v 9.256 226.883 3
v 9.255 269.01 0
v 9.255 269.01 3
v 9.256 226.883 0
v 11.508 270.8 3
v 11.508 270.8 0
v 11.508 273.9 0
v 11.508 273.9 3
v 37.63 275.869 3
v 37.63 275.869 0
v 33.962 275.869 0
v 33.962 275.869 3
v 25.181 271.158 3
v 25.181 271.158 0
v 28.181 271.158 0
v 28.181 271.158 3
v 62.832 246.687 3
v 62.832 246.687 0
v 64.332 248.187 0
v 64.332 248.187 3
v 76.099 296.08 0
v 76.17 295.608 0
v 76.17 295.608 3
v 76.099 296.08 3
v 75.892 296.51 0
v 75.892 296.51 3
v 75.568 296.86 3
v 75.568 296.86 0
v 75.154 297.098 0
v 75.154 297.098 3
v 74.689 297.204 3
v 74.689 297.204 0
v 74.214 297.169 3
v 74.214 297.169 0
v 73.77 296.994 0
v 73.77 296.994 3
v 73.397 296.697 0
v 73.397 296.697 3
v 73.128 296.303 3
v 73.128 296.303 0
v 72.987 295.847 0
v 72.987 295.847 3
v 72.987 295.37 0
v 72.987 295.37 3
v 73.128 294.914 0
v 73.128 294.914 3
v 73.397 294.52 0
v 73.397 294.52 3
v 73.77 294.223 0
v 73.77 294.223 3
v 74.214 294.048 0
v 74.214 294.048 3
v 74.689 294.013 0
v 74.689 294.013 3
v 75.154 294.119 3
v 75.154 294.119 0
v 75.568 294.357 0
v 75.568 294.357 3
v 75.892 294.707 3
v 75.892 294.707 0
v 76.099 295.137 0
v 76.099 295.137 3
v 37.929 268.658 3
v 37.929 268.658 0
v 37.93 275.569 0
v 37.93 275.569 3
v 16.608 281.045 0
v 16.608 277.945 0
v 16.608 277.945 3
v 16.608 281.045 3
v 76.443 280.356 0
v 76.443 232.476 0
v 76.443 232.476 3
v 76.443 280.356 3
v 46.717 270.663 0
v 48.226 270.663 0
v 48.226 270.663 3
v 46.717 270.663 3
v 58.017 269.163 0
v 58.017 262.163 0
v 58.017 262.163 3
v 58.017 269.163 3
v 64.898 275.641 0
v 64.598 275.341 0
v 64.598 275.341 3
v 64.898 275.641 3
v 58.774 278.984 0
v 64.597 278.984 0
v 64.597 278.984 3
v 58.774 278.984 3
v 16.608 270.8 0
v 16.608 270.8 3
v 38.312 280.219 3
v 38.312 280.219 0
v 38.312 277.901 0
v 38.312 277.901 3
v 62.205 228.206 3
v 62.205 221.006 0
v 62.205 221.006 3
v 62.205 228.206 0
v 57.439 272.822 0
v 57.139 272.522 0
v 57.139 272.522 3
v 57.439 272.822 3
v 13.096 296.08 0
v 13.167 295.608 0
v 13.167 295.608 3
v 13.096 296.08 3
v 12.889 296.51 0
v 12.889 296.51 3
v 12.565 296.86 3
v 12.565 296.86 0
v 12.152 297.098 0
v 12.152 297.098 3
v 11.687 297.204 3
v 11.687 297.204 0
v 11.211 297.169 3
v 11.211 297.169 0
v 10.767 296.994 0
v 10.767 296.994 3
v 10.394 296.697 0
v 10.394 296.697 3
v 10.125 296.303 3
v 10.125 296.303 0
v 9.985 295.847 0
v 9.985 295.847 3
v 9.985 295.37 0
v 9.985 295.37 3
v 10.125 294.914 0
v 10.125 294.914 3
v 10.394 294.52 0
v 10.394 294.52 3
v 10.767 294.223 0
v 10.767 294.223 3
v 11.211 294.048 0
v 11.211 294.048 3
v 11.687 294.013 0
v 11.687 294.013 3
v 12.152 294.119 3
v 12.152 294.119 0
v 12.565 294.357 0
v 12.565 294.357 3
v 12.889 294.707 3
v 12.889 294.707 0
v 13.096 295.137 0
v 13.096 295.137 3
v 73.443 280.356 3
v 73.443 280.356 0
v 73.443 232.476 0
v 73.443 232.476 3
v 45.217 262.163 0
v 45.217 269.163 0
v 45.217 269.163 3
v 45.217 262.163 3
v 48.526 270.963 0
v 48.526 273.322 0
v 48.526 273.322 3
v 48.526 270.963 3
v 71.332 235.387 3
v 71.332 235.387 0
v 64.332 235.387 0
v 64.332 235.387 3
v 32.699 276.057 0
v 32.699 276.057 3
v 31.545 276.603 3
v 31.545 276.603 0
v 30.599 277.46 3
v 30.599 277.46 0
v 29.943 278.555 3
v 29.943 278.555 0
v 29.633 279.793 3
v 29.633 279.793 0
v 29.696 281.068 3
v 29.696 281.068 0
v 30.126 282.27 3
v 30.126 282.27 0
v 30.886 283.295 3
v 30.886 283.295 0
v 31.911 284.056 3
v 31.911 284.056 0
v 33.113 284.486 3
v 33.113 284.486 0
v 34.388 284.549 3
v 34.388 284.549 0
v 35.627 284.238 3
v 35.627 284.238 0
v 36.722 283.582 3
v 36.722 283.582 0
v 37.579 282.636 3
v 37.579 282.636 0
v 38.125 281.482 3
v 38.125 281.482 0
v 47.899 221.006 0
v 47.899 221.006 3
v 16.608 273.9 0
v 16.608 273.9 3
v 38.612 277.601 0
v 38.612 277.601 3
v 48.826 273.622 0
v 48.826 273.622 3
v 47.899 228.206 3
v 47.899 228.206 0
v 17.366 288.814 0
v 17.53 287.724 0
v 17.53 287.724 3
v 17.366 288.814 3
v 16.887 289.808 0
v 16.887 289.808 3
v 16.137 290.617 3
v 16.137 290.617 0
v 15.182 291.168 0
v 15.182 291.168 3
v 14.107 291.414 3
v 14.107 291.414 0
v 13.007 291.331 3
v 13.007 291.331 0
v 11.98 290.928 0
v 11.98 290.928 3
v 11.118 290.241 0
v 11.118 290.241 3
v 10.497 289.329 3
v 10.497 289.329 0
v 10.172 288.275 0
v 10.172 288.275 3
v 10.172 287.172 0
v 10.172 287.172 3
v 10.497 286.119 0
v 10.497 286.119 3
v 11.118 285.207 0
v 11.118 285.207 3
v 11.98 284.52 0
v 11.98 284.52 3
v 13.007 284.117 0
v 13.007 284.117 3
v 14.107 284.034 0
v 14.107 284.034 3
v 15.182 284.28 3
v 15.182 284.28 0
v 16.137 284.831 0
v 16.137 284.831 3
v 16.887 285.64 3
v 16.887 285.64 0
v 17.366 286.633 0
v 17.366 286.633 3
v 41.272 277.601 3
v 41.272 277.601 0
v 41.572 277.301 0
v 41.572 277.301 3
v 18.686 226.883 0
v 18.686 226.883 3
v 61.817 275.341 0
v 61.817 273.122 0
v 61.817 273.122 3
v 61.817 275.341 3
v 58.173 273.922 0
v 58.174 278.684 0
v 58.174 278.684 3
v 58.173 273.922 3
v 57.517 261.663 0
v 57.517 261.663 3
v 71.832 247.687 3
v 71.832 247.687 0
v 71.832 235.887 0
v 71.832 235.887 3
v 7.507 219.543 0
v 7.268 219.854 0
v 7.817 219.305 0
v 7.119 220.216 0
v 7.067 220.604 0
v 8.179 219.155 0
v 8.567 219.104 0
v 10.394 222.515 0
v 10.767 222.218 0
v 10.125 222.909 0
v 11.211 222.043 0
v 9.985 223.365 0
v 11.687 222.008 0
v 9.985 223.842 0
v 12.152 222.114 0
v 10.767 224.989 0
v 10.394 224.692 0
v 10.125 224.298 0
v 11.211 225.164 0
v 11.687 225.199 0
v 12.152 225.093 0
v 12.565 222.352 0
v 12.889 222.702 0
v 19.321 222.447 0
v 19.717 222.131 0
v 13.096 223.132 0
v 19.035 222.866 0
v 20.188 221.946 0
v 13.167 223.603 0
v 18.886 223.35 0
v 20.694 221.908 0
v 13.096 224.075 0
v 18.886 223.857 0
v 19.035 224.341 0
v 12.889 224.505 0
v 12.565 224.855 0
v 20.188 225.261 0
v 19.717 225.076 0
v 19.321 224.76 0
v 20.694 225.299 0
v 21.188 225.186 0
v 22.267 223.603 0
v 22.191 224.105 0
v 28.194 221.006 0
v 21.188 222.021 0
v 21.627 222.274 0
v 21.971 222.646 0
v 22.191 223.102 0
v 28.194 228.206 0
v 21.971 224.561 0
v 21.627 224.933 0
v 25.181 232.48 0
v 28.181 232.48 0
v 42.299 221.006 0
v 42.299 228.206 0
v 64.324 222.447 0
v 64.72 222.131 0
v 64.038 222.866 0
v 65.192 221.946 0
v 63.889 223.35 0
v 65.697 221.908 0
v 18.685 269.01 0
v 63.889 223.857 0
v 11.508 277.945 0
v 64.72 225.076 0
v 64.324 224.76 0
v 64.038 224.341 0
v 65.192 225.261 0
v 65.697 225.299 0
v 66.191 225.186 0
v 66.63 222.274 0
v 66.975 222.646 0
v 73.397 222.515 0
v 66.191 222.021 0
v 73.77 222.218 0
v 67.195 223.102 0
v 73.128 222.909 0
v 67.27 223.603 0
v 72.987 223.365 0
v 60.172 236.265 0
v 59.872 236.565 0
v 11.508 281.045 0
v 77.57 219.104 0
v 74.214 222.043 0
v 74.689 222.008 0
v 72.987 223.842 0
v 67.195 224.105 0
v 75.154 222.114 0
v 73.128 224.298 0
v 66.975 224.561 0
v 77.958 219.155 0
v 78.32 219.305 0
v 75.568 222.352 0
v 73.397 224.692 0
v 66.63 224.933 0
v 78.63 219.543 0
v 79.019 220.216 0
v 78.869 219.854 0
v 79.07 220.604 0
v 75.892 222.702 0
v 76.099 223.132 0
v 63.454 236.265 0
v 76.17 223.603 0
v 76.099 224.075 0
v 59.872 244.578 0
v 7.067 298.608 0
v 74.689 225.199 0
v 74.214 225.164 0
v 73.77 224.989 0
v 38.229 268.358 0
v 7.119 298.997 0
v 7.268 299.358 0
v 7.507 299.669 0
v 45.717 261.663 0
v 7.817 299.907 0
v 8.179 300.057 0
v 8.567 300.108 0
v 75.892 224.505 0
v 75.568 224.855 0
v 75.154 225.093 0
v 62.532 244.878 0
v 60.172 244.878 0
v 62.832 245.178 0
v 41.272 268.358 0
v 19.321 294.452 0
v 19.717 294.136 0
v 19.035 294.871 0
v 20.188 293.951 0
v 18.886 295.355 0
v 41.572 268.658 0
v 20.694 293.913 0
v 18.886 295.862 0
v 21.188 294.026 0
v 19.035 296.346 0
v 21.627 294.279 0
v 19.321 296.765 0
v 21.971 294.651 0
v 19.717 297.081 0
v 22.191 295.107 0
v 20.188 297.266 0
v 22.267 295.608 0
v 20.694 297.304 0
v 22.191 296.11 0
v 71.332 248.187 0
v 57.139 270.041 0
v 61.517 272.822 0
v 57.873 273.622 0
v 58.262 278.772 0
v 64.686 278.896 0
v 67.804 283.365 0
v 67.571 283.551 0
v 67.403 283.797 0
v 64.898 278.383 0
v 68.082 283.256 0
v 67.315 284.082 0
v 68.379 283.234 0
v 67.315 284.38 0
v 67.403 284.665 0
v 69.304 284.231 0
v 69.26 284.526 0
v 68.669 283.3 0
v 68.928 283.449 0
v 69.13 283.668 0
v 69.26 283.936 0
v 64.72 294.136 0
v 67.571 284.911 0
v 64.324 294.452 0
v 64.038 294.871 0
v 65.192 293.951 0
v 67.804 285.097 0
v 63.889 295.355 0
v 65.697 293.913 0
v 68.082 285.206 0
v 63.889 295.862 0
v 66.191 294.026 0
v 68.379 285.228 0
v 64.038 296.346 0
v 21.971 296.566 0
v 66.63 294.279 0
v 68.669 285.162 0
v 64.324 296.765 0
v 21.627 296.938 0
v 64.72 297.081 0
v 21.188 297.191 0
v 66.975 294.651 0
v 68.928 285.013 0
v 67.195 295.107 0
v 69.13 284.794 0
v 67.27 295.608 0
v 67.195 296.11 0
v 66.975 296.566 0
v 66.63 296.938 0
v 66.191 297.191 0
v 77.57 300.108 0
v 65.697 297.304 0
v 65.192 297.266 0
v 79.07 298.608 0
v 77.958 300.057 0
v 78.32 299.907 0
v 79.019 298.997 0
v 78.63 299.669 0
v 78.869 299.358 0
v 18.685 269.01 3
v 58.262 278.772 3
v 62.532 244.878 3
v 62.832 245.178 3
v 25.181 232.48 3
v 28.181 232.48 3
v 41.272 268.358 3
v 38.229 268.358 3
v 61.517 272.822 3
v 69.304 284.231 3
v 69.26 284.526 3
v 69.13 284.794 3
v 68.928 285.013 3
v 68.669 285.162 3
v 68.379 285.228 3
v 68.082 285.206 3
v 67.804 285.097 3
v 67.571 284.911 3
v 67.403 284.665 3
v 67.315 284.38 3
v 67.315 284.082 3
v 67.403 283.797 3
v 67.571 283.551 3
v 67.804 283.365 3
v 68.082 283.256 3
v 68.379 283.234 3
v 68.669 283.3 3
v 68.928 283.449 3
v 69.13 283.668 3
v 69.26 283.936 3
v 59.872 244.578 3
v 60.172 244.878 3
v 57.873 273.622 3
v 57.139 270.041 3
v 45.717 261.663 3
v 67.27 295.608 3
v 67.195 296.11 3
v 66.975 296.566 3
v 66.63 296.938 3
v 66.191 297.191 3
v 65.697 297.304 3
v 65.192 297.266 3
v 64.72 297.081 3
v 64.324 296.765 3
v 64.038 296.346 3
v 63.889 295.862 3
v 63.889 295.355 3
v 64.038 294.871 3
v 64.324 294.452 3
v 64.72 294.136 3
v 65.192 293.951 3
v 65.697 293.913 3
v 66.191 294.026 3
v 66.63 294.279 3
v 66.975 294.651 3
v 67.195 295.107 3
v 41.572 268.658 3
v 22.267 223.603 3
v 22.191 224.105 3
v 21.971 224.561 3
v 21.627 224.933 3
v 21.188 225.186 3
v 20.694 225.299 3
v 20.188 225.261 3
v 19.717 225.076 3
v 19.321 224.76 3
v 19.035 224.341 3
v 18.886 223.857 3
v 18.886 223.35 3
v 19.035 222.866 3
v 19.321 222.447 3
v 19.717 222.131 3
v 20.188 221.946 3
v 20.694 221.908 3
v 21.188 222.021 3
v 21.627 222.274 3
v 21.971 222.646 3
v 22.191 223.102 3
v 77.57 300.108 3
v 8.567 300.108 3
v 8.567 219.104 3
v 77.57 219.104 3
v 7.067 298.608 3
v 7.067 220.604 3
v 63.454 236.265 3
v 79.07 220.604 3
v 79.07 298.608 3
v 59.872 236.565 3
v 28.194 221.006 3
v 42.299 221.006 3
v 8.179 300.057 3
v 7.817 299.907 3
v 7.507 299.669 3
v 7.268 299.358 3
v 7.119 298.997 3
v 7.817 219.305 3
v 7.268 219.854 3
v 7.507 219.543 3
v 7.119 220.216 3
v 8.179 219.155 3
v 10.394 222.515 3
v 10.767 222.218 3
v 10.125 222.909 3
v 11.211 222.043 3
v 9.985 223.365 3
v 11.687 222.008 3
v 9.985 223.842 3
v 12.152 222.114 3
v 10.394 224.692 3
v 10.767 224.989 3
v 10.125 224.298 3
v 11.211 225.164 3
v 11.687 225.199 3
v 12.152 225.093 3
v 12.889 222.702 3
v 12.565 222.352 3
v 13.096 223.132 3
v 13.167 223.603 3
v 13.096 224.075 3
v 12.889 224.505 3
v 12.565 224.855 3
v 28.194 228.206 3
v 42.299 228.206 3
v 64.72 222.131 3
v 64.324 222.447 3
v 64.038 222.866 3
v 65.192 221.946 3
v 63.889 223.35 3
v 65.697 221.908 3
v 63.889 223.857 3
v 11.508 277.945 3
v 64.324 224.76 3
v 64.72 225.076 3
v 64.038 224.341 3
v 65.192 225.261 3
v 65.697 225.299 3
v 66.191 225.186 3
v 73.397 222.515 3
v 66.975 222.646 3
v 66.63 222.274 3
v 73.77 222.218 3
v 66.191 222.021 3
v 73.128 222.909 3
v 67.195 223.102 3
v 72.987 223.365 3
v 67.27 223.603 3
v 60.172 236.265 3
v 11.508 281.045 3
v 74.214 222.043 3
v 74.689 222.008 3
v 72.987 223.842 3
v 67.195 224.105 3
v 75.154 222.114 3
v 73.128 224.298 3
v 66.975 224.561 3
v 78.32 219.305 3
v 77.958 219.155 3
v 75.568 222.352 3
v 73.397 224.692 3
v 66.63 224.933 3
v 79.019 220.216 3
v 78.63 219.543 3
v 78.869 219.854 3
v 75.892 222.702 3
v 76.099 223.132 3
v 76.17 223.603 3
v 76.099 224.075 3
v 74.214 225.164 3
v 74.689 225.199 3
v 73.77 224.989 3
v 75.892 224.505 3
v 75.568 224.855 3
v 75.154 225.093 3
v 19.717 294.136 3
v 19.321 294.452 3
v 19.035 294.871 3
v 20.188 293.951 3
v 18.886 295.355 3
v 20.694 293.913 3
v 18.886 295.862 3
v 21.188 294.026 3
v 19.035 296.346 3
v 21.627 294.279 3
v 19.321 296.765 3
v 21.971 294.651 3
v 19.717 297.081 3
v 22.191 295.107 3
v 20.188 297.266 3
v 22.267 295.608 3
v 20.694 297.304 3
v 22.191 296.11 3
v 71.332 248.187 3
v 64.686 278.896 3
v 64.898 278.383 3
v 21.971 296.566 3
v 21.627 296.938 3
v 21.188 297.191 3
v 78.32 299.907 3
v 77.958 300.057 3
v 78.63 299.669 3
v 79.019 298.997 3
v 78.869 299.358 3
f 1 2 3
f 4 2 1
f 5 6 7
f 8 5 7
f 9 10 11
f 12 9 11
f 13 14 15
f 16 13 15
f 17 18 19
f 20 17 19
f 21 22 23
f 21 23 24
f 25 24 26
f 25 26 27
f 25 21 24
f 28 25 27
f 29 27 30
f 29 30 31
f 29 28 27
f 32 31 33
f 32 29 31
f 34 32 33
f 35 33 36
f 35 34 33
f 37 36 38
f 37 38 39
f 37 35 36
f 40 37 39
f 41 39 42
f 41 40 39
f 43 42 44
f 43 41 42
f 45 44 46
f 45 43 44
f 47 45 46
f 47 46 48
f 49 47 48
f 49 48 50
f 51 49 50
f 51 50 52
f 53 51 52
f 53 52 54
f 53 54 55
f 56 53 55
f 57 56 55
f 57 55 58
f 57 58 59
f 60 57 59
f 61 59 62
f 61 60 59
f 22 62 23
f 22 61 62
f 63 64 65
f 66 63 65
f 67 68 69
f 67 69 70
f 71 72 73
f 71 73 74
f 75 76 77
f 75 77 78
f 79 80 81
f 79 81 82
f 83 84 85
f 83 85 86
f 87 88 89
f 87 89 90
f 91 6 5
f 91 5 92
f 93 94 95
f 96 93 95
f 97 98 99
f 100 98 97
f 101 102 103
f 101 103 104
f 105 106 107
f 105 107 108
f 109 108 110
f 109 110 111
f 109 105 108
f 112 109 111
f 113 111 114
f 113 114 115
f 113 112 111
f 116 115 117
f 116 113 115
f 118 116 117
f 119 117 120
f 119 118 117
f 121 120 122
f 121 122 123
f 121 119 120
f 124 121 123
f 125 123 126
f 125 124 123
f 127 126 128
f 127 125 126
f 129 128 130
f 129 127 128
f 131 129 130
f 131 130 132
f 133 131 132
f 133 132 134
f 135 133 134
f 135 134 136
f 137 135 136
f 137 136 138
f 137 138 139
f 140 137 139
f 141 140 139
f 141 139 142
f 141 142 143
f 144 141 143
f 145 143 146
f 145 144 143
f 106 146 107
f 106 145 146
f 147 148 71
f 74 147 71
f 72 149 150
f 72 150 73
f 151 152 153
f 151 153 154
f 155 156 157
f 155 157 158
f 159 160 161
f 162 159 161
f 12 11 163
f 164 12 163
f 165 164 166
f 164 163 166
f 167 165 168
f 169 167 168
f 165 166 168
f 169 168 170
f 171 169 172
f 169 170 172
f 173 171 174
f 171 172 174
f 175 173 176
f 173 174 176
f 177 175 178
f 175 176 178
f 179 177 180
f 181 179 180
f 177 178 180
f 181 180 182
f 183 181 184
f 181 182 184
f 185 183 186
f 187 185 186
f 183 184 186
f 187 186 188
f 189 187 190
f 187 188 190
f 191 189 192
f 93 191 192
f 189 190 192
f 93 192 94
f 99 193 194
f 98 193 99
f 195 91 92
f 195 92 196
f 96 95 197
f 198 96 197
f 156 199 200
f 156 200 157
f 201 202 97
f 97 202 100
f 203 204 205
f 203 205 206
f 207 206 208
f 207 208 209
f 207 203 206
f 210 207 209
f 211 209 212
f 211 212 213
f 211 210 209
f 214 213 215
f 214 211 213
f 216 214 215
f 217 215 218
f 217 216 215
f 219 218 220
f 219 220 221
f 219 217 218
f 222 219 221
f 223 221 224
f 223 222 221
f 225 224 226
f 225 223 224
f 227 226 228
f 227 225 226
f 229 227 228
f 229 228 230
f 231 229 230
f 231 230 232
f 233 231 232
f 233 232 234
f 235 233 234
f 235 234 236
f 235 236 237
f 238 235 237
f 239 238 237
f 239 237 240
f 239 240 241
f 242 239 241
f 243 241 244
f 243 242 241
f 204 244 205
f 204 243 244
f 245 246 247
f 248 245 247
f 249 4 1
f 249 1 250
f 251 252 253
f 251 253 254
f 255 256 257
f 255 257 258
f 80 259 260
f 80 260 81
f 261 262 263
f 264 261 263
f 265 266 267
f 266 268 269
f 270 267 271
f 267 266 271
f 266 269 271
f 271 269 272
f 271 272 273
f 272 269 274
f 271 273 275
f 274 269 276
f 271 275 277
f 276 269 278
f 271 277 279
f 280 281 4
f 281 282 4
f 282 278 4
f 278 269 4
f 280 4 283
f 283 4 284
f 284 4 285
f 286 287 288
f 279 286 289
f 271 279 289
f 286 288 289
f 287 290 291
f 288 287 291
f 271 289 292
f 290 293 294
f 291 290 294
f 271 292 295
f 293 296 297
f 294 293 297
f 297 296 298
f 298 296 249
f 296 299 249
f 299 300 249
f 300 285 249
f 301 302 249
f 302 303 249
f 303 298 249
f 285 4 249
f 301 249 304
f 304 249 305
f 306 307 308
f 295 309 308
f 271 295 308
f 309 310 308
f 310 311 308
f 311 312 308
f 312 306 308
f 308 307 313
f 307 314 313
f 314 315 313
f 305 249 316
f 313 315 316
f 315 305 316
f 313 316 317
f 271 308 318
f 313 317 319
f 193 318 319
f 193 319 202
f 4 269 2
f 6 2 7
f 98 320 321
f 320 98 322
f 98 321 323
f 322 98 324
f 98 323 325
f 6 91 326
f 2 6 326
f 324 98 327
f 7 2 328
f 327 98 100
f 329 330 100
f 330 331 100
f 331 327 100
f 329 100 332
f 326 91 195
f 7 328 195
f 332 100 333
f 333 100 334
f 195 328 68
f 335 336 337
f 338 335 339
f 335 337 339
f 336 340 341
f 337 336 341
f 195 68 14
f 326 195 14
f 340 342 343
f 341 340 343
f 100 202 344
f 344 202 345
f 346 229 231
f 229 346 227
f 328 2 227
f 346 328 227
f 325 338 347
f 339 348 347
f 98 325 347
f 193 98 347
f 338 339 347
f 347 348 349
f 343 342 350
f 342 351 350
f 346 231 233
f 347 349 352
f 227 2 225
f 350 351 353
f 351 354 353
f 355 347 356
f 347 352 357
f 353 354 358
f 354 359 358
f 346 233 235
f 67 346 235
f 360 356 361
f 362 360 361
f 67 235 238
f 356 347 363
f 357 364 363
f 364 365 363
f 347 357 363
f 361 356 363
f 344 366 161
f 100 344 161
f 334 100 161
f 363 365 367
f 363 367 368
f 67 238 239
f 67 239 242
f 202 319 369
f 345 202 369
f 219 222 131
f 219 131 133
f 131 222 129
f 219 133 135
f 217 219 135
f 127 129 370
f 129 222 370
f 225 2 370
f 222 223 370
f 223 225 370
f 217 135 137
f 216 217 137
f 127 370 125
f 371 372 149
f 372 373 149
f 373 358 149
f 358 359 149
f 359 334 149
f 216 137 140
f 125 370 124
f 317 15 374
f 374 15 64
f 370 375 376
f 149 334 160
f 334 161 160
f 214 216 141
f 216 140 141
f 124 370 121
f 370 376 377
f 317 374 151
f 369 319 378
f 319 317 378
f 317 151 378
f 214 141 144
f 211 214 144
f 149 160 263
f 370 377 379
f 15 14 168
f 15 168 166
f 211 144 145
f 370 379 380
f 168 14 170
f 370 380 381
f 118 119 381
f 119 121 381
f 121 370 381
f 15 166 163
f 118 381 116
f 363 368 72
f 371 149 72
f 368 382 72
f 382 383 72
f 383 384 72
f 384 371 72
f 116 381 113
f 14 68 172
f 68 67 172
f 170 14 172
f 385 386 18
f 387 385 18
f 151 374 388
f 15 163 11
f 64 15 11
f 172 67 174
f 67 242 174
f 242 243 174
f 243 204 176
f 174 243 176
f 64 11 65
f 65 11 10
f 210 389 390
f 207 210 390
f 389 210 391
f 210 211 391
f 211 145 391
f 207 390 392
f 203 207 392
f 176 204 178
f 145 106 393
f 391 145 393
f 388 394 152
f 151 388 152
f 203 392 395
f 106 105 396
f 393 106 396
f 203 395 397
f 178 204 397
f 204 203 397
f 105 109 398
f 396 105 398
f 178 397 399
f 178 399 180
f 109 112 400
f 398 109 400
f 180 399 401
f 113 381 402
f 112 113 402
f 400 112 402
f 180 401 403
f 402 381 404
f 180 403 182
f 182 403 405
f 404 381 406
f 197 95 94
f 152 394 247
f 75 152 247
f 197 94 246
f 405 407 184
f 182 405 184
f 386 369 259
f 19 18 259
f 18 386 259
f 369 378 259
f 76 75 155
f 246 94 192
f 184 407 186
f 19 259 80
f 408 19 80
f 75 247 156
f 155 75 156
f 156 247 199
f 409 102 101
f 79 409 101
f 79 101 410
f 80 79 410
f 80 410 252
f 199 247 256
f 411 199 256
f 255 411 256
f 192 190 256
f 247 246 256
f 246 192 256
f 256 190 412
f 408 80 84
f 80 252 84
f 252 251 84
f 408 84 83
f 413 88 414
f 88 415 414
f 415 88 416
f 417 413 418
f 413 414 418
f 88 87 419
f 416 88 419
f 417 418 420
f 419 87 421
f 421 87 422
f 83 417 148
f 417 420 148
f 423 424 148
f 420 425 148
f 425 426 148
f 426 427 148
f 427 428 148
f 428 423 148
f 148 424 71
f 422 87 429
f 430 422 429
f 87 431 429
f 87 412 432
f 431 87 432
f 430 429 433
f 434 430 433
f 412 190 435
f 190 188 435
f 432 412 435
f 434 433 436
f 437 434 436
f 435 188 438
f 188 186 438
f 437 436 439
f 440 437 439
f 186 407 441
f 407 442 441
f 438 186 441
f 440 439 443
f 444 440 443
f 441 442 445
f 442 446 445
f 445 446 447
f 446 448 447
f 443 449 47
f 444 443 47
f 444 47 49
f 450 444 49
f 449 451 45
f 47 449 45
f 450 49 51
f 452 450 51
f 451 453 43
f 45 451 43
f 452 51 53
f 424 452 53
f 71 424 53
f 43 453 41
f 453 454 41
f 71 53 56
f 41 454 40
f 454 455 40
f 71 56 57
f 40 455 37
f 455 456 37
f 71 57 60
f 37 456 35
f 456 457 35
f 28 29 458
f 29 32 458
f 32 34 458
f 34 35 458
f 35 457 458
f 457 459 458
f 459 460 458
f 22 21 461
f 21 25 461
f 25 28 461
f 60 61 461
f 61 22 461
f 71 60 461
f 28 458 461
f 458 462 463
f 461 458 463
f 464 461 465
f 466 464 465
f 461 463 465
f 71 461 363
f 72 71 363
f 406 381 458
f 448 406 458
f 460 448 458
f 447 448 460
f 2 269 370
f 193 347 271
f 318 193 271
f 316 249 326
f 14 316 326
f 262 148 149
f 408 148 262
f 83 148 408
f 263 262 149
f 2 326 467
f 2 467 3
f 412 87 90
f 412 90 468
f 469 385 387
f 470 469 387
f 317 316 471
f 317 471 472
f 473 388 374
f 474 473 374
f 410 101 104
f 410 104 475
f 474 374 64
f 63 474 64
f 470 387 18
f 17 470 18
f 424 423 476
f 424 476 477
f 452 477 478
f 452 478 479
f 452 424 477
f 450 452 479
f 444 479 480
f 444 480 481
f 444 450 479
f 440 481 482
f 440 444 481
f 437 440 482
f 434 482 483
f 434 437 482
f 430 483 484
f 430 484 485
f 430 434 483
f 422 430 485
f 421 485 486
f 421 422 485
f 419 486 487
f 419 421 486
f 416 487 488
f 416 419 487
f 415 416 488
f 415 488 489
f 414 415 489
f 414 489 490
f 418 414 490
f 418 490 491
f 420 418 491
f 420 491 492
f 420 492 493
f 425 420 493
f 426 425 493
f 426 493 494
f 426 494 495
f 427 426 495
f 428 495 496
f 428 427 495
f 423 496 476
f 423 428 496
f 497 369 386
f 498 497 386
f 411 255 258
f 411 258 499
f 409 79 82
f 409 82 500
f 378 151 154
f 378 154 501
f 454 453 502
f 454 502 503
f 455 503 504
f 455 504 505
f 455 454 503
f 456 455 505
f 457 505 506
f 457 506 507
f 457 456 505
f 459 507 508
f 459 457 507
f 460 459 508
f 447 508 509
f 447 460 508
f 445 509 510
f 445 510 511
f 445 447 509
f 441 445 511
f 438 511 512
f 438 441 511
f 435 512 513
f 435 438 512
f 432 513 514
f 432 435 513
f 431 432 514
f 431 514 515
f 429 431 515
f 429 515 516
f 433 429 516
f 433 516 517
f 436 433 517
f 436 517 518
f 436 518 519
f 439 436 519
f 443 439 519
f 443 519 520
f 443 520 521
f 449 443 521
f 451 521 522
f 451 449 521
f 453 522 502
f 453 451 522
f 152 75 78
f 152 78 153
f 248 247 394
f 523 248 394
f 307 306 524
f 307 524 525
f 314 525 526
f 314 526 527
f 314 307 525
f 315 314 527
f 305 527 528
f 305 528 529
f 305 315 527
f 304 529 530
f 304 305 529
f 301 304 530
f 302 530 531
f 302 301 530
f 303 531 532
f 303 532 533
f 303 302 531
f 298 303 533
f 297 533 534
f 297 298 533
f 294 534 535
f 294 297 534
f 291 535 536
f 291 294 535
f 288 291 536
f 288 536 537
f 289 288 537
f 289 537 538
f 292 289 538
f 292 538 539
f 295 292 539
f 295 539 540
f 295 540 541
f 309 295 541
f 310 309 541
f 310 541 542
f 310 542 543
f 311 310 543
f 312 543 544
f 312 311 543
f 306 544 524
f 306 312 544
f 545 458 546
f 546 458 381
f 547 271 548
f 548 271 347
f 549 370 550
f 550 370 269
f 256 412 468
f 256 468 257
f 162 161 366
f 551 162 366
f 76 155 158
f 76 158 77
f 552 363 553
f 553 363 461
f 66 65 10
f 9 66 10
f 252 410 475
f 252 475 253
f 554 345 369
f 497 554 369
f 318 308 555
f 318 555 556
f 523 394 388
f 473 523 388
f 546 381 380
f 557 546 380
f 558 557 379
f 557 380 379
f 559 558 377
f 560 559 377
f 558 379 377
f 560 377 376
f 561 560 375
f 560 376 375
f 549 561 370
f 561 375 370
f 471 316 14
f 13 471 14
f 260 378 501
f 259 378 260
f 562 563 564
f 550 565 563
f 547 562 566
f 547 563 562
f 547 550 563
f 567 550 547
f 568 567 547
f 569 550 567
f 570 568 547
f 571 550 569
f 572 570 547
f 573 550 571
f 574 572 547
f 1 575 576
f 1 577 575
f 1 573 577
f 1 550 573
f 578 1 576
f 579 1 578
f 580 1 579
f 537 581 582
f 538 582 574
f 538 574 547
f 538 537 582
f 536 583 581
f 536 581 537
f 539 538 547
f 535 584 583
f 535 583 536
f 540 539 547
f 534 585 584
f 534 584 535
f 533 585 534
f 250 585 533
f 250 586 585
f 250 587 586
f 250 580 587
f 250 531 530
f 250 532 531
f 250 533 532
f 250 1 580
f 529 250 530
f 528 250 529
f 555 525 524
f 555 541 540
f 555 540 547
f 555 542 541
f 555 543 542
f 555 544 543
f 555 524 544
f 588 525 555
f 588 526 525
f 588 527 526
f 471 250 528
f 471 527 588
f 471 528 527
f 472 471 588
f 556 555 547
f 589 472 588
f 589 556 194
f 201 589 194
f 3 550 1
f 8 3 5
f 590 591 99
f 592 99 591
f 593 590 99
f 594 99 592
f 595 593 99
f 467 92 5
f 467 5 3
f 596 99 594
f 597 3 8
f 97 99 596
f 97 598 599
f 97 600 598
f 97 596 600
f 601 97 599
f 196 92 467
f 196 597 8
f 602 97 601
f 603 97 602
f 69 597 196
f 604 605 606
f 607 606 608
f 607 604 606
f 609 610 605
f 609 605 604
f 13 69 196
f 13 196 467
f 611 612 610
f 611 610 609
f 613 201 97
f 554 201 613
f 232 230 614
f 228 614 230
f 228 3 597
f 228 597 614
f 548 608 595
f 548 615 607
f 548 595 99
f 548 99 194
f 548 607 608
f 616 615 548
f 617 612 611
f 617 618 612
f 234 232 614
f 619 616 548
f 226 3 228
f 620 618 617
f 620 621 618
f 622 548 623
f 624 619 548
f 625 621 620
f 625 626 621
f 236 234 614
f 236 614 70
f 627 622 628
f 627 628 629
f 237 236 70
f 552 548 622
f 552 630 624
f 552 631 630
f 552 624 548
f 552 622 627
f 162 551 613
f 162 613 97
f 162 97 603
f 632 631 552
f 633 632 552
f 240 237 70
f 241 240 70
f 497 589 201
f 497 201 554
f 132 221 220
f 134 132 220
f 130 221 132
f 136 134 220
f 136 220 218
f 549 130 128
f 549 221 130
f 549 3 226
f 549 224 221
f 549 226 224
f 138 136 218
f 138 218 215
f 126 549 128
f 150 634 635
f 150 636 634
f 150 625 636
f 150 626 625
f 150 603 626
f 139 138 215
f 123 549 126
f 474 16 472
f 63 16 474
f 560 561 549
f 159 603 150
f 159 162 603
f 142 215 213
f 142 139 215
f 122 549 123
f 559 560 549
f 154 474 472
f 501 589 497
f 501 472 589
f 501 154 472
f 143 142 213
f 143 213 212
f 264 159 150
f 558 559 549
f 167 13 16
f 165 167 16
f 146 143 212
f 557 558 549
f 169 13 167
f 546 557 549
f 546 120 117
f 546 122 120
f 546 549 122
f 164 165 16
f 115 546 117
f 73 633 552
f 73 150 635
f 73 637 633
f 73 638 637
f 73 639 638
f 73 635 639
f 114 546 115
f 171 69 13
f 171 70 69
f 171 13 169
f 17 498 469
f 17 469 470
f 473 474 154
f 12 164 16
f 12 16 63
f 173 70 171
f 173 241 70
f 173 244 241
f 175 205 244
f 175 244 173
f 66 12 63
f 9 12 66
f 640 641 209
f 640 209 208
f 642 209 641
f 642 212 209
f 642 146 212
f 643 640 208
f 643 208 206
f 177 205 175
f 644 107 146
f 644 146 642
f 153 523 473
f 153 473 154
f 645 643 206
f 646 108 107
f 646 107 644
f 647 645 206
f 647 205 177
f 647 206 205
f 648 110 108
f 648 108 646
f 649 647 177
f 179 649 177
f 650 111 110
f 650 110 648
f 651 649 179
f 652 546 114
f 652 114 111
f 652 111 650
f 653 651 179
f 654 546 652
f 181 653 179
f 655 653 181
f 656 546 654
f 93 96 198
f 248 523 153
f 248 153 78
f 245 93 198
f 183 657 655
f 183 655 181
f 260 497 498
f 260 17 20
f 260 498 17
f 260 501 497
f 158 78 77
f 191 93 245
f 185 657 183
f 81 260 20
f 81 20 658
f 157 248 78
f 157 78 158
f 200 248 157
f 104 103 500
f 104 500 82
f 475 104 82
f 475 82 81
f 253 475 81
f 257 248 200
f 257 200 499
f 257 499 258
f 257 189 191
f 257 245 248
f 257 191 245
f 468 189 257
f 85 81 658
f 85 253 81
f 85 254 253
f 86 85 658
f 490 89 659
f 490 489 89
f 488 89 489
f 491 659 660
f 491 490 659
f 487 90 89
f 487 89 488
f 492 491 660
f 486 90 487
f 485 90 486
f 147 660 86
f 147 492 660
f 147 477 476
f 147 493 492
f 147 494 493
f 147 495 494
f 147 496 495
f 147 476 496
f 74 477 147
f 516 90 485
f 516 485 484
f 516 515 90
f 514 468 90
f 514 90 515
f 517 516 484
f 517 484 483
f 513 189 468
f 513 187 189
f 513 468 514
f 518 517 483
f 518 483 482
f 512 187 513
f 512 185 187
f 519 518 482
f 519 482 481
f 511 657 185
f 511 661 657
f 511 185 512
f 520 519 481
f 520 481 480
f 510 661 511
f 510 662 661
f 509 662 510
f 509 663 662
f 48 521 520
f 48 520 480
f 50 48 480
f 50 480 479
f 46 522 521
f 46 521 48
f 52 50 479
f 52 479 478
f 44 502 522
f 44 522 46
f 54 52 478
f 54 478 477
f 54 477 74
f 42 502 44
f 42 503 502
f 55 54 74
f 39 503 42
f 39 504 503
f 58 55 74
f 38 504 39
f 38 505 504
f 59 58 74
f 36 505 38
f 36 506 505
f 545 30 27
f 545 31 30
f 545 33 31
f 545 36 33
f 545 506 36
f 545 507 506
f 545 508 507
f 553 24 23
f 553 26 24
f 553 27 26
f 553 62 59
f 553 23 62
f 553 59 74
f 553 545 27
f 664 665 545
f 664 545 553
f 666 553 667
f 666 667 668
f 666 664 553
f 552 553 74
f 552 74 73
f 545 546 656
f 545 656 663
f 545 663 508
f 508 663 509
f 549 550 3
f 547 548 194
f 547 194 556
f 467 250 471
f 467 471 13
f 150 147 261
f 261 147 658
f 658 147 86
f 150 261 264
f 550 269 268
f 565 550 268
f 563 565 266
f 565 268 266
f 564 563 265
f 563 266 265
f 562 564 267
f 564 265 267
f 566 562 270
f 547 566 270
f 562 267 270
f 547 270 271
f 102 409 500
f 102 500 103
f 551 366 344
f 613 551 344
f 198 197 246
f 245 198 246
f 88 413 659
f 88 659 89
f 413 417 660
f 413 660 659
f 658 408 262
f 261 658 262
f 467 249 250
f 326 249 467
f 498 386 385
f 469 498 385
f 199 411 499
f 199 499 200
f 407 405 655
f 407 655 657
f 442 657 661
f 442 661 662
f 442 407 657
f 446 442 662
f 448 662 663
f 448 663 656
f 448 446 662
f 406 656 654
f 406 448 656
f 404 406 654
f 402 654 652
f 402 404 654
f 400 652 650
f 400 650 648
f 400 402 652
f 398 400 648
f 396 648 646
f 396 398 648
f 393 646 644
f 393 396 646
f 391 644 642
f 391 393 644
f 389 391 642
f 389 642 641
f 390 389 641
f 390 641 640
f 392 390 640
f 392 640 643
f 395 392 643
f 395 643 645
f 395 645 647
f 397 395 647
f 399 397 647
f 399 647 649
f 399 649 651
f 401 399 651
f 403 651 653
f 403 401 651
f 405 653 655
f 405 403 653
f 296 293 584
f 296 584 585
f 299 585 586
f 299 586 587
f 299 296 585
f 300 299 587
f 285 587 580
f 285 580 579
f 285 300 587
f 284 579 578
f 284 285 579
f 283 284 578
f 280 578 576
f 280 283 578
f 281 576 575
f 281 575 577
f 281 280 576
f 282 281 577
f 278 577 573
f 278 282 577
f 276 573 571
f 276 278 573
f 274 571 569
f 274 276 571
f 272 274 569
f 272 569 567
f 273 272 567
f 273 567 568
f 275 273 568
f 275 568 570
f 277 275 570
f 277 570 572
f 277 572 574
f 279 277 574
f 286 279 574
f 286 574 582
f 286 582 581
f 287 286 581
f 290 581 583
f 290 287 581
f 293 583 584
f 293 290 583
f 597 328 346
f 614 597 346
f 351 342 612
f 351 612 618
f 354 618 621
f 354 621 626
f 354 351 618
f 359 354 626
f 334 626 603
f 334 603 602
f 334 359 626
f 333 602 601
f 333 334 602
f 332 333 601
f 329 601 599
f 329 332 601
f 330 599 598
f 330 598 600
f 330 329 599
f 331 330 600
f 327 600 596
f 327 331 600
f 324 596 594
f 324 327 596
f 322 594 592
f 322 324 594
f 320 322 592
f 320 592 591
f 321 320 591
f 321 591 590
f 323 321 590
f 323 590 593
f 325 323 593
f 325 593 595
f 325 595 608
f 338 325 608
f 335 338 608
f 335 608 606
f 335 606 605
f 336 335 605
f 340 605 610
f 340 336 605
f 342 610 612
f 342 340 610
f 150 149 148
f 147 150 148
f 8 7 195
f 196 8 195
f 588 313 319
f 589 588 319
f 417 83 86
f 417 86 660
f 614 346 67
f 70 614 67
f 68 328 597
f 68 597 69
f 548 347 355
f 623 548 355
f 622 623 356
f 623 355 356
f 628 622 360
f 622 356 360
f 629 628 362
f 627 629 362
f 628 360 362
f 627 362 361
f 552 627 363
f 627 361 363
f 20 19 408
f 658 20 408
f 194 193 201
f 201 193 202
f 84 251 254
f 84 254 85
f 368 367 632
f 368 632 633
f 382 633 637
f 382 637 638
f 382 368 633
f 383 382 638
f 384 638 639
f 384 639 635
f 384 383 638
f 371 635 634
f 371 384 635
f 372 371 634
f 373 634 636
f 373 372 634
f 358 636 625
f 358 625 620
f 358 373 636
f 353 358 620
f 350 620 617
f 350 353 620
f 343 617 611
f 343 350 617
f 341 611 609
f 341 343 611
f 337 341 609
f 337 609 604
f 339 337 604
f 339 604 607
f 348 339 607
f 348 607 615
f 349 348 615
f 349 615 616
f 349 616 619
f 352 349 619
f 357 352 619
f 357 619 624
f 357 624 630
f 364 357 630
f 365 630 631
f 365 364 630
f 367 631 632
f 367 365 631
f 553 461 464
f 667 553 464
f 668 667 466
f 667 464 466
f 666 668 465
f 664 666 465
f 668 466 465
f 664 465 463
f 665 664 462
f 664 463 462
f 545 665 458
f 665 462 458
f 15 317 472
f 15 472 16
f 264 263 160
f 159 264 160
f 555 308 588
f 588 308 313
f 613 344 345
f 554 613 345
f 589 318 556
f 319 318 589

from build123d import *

# Parameters (mm, degrees)
MODEL_R                 = 1
MODEL_R_2               = 3.7
MODEL_R_3               = 1.7
MODEL_R_4               = 1.600279216
MODEL_W                 = 3
MODEL_H                 = 47.88
MODEL_H_2               = 38.677610829
MODEL_W_2               = 14.305297
MODEL_H_3               = 7.199932059
MODEL_W_3               = 14.105297
MODEL_W_4               = 5.1
MODEL_H_4               = 3.1
SALIENTE_EXTRUIR1_DEPTH = 3


with BuildPart() as part:
    # Model → Saliente-Extruir1 (new body)
    with BuildSketch(Plane.XY):
        with BuildLine():
            Line((79.069803803, 220.603820632), (79.069803803, 298.60843049))
            ThreePointArc((79.069803803, 298.60843049), (78.630463975, 299.669090662), (77.569803803, 300.10843049))
            Line((77.569803803, 300.10843049), (8.567399569, 300.10843049))
            ThreePointArc((8.567399569, 300.10843049), (7.506739397, 299.669090662), (7.067399569, 298.60843049))
            Line((7.067399569, 298.60843049), (7.067399569, 220.603820632))
            ThreePointArc((7.067399569, 220.603820632), (7.506739397, 219.54316046), (8.567399569, 219.103820632))
            Line((8.567399569, 219.103820632), (77.569803803, 219.103820632))
            ThreePointArc((77.569803803, 219.103820632), (78.630463975, 219.54316046), (79.069803803, 220.603820632))
        make_face()
        with Locations((68.304134727, 284.23112787)):
            Circle(MODEL_R, mode=Mode.SUBTRACT)
        with Locations((13.830317101, 287.723880192)):
            Circle(MODEL_R_2, mode=Mode.SUBTRACT)
        with Locations((20.566730565, 223.60348613)):
            Circle(MODEL_R_3, mode=Mode.SUBTRACT)
        with Locations((65.570138305, 223.60348613)):
            Circle(MODEL_R_3, mode=Mode.SUBTRACT)
        with Locations((11.567065067, 223.60348613)):
            Circle(MODEL_R_4, mode=Mode.SUBTRACT)
        with Locations((74.569803803, 223.60348613)):
            Circle(MODEL_R_4, mode=Mode.SUBTRACT)
        with Locations((20.566730565, 295.60843049)):
            Circle(MODEL_R_3, mode=Mode.SUBTRACT)
        with Locations((65.570138305, 295.60843049)):
            Circle(MODEL_R_3, mode=Mode.SUBTRACT)
        with Locations((74.569803803, 295.60843049)):
            Circle(MODEL_R_4, mode=Mode.SUBTRACT)
        with Locations((11.567065067, 295.60843049)):
            Circle(MODEL_R_4, mode=Mode.SUBTRACT)
        with Locations((74.943202287, 256.416250186)):
            Rectangle(MODEL_W, MODEL_H, mode=Mode.SUBTRACT)
        with Locations((26.680813222, 251.818953656)):
            Rectangle(MODEL_W, MODEL_H_2, mode=Mode.SUBTRACT)
        Polygon((9.255063306, 269.010369093), (9.256333369, 226.883193232), (18.686310635, 226.883193232), (18.685040572, 269.010369093), align=None, mode=Mode.SUBTRACT)
        with BuildLine():
            Line((37.928978937, 268.658416829), (37.930092901, 275.569446794))
            Line((37.930092901, 275.569446794), (37.630141257, 275.86944679))
            Line((37.630141257, 275.86944679), (33.962054567, 275.86944679))
            ThreePointArc((33.962054567, 275.86944679), (30.886140069, 283.295361288), (38.312054567, 280.21944679))
            Line((38.312054567, 280.21944679), (38.312054567, 277.90087731))
            Line((38.312054567, 277.90087731), (38.612054567, 277.60087731))
            Line((38.612054567, 277.60087731), (41.272484784, 277.60087731))
            Line((41.272484784, 277.60087731), (41.572484784, 277.30087731))
            Line((41.572484784, 277.30087731), (41.572484784, 268.658416833))
            Line((41.572484784, 268.658416833), (41.272484784, 268.358416833))
            Line((41.272484784, 268.358416833), (38.228930581, 268.358416833))
            Line((38.228930581, 268.358416833), (37.928978937, 268.658416829))
        make_face(mode=Mode.SUBTRACT)
        with Locations((55.052147548, 224.605565735)):
            Rectangle(MODEL_W_2, MODEL_H_3, mode=Mode.SUBTRACT)
        with Locations((35.246780171, 224.605565735)):
            Rectangle(MODEL_W_3, MODEL_H_3, mode=Mode.SUBTRACT)
        with Locations((14.057658355, 272.349769149)):
            Rectangle(MODEL_W_4, MODEL_H_4, mode=Mode.SUBTRACT)
        with Locations((14.057658355, 279.495142856)):
            Rectangle(MODEL_W_4, MODEL_H_4, mode=Mode.SUBTRACT)
        Polygon((45.217053505, 262.162824271), (45.717053505, 261.662824271), (57.517053505, 261.662824271), (58.017053505, 262.162824271), (58.017053505, 269.162824271), (57.139240746, 270.040637031), (57.139240746, 272.521816974), (57.439240746, 272.821816974), (61.516534187, 272.821816974), (61.816534188, 273.121816974), (61.816534188, 275.340900661), (64.597764426, 275.340900661), (64.897764426, 275.640900661), (64.897764426, 278.38346156), (64.685649489, 278.89561069), (64.596997018, 278.984277451), (58.773973289, 278.984277451), (58.261824159, 278.772162514), (58.173924933, 278.684277455), (58.173157398, 273.922486249), (57.873109042, 273.622486253), (48.826048419, 273.622486253), (48.526048419, 273.322486253), (48.526048419, 270.962824271), (48.226048419, 270.662824271), (46.717053505, 270.662824271), (45.217053505, 269.162824271), align=None, mode=Mode.SUBTRACT)
        Polygon((63.45410467, 236.265050938), (60.172255448, 236.265050938), (59.872255448, 236.565050938), (59.872255448, 244.578243265), (60.172255448, 244.878243265), (62.53191743, 244.878243265), (62.83191743, 245.178243265), (62.83191743, 246.687238178), (64.33191743, 248.187238178), (71.33191743, 248.187238178), (71.83191743, 247.687238178), (71.83191743, 235.887238179), (71.33191743, 235.387238179), (64.33191743, 235.387238179), align=None, mode=Mode.SUBTRACT)
    extrude(amount=SALIENTE_EXTRUIR1_DEPTH)


solid = part.part
